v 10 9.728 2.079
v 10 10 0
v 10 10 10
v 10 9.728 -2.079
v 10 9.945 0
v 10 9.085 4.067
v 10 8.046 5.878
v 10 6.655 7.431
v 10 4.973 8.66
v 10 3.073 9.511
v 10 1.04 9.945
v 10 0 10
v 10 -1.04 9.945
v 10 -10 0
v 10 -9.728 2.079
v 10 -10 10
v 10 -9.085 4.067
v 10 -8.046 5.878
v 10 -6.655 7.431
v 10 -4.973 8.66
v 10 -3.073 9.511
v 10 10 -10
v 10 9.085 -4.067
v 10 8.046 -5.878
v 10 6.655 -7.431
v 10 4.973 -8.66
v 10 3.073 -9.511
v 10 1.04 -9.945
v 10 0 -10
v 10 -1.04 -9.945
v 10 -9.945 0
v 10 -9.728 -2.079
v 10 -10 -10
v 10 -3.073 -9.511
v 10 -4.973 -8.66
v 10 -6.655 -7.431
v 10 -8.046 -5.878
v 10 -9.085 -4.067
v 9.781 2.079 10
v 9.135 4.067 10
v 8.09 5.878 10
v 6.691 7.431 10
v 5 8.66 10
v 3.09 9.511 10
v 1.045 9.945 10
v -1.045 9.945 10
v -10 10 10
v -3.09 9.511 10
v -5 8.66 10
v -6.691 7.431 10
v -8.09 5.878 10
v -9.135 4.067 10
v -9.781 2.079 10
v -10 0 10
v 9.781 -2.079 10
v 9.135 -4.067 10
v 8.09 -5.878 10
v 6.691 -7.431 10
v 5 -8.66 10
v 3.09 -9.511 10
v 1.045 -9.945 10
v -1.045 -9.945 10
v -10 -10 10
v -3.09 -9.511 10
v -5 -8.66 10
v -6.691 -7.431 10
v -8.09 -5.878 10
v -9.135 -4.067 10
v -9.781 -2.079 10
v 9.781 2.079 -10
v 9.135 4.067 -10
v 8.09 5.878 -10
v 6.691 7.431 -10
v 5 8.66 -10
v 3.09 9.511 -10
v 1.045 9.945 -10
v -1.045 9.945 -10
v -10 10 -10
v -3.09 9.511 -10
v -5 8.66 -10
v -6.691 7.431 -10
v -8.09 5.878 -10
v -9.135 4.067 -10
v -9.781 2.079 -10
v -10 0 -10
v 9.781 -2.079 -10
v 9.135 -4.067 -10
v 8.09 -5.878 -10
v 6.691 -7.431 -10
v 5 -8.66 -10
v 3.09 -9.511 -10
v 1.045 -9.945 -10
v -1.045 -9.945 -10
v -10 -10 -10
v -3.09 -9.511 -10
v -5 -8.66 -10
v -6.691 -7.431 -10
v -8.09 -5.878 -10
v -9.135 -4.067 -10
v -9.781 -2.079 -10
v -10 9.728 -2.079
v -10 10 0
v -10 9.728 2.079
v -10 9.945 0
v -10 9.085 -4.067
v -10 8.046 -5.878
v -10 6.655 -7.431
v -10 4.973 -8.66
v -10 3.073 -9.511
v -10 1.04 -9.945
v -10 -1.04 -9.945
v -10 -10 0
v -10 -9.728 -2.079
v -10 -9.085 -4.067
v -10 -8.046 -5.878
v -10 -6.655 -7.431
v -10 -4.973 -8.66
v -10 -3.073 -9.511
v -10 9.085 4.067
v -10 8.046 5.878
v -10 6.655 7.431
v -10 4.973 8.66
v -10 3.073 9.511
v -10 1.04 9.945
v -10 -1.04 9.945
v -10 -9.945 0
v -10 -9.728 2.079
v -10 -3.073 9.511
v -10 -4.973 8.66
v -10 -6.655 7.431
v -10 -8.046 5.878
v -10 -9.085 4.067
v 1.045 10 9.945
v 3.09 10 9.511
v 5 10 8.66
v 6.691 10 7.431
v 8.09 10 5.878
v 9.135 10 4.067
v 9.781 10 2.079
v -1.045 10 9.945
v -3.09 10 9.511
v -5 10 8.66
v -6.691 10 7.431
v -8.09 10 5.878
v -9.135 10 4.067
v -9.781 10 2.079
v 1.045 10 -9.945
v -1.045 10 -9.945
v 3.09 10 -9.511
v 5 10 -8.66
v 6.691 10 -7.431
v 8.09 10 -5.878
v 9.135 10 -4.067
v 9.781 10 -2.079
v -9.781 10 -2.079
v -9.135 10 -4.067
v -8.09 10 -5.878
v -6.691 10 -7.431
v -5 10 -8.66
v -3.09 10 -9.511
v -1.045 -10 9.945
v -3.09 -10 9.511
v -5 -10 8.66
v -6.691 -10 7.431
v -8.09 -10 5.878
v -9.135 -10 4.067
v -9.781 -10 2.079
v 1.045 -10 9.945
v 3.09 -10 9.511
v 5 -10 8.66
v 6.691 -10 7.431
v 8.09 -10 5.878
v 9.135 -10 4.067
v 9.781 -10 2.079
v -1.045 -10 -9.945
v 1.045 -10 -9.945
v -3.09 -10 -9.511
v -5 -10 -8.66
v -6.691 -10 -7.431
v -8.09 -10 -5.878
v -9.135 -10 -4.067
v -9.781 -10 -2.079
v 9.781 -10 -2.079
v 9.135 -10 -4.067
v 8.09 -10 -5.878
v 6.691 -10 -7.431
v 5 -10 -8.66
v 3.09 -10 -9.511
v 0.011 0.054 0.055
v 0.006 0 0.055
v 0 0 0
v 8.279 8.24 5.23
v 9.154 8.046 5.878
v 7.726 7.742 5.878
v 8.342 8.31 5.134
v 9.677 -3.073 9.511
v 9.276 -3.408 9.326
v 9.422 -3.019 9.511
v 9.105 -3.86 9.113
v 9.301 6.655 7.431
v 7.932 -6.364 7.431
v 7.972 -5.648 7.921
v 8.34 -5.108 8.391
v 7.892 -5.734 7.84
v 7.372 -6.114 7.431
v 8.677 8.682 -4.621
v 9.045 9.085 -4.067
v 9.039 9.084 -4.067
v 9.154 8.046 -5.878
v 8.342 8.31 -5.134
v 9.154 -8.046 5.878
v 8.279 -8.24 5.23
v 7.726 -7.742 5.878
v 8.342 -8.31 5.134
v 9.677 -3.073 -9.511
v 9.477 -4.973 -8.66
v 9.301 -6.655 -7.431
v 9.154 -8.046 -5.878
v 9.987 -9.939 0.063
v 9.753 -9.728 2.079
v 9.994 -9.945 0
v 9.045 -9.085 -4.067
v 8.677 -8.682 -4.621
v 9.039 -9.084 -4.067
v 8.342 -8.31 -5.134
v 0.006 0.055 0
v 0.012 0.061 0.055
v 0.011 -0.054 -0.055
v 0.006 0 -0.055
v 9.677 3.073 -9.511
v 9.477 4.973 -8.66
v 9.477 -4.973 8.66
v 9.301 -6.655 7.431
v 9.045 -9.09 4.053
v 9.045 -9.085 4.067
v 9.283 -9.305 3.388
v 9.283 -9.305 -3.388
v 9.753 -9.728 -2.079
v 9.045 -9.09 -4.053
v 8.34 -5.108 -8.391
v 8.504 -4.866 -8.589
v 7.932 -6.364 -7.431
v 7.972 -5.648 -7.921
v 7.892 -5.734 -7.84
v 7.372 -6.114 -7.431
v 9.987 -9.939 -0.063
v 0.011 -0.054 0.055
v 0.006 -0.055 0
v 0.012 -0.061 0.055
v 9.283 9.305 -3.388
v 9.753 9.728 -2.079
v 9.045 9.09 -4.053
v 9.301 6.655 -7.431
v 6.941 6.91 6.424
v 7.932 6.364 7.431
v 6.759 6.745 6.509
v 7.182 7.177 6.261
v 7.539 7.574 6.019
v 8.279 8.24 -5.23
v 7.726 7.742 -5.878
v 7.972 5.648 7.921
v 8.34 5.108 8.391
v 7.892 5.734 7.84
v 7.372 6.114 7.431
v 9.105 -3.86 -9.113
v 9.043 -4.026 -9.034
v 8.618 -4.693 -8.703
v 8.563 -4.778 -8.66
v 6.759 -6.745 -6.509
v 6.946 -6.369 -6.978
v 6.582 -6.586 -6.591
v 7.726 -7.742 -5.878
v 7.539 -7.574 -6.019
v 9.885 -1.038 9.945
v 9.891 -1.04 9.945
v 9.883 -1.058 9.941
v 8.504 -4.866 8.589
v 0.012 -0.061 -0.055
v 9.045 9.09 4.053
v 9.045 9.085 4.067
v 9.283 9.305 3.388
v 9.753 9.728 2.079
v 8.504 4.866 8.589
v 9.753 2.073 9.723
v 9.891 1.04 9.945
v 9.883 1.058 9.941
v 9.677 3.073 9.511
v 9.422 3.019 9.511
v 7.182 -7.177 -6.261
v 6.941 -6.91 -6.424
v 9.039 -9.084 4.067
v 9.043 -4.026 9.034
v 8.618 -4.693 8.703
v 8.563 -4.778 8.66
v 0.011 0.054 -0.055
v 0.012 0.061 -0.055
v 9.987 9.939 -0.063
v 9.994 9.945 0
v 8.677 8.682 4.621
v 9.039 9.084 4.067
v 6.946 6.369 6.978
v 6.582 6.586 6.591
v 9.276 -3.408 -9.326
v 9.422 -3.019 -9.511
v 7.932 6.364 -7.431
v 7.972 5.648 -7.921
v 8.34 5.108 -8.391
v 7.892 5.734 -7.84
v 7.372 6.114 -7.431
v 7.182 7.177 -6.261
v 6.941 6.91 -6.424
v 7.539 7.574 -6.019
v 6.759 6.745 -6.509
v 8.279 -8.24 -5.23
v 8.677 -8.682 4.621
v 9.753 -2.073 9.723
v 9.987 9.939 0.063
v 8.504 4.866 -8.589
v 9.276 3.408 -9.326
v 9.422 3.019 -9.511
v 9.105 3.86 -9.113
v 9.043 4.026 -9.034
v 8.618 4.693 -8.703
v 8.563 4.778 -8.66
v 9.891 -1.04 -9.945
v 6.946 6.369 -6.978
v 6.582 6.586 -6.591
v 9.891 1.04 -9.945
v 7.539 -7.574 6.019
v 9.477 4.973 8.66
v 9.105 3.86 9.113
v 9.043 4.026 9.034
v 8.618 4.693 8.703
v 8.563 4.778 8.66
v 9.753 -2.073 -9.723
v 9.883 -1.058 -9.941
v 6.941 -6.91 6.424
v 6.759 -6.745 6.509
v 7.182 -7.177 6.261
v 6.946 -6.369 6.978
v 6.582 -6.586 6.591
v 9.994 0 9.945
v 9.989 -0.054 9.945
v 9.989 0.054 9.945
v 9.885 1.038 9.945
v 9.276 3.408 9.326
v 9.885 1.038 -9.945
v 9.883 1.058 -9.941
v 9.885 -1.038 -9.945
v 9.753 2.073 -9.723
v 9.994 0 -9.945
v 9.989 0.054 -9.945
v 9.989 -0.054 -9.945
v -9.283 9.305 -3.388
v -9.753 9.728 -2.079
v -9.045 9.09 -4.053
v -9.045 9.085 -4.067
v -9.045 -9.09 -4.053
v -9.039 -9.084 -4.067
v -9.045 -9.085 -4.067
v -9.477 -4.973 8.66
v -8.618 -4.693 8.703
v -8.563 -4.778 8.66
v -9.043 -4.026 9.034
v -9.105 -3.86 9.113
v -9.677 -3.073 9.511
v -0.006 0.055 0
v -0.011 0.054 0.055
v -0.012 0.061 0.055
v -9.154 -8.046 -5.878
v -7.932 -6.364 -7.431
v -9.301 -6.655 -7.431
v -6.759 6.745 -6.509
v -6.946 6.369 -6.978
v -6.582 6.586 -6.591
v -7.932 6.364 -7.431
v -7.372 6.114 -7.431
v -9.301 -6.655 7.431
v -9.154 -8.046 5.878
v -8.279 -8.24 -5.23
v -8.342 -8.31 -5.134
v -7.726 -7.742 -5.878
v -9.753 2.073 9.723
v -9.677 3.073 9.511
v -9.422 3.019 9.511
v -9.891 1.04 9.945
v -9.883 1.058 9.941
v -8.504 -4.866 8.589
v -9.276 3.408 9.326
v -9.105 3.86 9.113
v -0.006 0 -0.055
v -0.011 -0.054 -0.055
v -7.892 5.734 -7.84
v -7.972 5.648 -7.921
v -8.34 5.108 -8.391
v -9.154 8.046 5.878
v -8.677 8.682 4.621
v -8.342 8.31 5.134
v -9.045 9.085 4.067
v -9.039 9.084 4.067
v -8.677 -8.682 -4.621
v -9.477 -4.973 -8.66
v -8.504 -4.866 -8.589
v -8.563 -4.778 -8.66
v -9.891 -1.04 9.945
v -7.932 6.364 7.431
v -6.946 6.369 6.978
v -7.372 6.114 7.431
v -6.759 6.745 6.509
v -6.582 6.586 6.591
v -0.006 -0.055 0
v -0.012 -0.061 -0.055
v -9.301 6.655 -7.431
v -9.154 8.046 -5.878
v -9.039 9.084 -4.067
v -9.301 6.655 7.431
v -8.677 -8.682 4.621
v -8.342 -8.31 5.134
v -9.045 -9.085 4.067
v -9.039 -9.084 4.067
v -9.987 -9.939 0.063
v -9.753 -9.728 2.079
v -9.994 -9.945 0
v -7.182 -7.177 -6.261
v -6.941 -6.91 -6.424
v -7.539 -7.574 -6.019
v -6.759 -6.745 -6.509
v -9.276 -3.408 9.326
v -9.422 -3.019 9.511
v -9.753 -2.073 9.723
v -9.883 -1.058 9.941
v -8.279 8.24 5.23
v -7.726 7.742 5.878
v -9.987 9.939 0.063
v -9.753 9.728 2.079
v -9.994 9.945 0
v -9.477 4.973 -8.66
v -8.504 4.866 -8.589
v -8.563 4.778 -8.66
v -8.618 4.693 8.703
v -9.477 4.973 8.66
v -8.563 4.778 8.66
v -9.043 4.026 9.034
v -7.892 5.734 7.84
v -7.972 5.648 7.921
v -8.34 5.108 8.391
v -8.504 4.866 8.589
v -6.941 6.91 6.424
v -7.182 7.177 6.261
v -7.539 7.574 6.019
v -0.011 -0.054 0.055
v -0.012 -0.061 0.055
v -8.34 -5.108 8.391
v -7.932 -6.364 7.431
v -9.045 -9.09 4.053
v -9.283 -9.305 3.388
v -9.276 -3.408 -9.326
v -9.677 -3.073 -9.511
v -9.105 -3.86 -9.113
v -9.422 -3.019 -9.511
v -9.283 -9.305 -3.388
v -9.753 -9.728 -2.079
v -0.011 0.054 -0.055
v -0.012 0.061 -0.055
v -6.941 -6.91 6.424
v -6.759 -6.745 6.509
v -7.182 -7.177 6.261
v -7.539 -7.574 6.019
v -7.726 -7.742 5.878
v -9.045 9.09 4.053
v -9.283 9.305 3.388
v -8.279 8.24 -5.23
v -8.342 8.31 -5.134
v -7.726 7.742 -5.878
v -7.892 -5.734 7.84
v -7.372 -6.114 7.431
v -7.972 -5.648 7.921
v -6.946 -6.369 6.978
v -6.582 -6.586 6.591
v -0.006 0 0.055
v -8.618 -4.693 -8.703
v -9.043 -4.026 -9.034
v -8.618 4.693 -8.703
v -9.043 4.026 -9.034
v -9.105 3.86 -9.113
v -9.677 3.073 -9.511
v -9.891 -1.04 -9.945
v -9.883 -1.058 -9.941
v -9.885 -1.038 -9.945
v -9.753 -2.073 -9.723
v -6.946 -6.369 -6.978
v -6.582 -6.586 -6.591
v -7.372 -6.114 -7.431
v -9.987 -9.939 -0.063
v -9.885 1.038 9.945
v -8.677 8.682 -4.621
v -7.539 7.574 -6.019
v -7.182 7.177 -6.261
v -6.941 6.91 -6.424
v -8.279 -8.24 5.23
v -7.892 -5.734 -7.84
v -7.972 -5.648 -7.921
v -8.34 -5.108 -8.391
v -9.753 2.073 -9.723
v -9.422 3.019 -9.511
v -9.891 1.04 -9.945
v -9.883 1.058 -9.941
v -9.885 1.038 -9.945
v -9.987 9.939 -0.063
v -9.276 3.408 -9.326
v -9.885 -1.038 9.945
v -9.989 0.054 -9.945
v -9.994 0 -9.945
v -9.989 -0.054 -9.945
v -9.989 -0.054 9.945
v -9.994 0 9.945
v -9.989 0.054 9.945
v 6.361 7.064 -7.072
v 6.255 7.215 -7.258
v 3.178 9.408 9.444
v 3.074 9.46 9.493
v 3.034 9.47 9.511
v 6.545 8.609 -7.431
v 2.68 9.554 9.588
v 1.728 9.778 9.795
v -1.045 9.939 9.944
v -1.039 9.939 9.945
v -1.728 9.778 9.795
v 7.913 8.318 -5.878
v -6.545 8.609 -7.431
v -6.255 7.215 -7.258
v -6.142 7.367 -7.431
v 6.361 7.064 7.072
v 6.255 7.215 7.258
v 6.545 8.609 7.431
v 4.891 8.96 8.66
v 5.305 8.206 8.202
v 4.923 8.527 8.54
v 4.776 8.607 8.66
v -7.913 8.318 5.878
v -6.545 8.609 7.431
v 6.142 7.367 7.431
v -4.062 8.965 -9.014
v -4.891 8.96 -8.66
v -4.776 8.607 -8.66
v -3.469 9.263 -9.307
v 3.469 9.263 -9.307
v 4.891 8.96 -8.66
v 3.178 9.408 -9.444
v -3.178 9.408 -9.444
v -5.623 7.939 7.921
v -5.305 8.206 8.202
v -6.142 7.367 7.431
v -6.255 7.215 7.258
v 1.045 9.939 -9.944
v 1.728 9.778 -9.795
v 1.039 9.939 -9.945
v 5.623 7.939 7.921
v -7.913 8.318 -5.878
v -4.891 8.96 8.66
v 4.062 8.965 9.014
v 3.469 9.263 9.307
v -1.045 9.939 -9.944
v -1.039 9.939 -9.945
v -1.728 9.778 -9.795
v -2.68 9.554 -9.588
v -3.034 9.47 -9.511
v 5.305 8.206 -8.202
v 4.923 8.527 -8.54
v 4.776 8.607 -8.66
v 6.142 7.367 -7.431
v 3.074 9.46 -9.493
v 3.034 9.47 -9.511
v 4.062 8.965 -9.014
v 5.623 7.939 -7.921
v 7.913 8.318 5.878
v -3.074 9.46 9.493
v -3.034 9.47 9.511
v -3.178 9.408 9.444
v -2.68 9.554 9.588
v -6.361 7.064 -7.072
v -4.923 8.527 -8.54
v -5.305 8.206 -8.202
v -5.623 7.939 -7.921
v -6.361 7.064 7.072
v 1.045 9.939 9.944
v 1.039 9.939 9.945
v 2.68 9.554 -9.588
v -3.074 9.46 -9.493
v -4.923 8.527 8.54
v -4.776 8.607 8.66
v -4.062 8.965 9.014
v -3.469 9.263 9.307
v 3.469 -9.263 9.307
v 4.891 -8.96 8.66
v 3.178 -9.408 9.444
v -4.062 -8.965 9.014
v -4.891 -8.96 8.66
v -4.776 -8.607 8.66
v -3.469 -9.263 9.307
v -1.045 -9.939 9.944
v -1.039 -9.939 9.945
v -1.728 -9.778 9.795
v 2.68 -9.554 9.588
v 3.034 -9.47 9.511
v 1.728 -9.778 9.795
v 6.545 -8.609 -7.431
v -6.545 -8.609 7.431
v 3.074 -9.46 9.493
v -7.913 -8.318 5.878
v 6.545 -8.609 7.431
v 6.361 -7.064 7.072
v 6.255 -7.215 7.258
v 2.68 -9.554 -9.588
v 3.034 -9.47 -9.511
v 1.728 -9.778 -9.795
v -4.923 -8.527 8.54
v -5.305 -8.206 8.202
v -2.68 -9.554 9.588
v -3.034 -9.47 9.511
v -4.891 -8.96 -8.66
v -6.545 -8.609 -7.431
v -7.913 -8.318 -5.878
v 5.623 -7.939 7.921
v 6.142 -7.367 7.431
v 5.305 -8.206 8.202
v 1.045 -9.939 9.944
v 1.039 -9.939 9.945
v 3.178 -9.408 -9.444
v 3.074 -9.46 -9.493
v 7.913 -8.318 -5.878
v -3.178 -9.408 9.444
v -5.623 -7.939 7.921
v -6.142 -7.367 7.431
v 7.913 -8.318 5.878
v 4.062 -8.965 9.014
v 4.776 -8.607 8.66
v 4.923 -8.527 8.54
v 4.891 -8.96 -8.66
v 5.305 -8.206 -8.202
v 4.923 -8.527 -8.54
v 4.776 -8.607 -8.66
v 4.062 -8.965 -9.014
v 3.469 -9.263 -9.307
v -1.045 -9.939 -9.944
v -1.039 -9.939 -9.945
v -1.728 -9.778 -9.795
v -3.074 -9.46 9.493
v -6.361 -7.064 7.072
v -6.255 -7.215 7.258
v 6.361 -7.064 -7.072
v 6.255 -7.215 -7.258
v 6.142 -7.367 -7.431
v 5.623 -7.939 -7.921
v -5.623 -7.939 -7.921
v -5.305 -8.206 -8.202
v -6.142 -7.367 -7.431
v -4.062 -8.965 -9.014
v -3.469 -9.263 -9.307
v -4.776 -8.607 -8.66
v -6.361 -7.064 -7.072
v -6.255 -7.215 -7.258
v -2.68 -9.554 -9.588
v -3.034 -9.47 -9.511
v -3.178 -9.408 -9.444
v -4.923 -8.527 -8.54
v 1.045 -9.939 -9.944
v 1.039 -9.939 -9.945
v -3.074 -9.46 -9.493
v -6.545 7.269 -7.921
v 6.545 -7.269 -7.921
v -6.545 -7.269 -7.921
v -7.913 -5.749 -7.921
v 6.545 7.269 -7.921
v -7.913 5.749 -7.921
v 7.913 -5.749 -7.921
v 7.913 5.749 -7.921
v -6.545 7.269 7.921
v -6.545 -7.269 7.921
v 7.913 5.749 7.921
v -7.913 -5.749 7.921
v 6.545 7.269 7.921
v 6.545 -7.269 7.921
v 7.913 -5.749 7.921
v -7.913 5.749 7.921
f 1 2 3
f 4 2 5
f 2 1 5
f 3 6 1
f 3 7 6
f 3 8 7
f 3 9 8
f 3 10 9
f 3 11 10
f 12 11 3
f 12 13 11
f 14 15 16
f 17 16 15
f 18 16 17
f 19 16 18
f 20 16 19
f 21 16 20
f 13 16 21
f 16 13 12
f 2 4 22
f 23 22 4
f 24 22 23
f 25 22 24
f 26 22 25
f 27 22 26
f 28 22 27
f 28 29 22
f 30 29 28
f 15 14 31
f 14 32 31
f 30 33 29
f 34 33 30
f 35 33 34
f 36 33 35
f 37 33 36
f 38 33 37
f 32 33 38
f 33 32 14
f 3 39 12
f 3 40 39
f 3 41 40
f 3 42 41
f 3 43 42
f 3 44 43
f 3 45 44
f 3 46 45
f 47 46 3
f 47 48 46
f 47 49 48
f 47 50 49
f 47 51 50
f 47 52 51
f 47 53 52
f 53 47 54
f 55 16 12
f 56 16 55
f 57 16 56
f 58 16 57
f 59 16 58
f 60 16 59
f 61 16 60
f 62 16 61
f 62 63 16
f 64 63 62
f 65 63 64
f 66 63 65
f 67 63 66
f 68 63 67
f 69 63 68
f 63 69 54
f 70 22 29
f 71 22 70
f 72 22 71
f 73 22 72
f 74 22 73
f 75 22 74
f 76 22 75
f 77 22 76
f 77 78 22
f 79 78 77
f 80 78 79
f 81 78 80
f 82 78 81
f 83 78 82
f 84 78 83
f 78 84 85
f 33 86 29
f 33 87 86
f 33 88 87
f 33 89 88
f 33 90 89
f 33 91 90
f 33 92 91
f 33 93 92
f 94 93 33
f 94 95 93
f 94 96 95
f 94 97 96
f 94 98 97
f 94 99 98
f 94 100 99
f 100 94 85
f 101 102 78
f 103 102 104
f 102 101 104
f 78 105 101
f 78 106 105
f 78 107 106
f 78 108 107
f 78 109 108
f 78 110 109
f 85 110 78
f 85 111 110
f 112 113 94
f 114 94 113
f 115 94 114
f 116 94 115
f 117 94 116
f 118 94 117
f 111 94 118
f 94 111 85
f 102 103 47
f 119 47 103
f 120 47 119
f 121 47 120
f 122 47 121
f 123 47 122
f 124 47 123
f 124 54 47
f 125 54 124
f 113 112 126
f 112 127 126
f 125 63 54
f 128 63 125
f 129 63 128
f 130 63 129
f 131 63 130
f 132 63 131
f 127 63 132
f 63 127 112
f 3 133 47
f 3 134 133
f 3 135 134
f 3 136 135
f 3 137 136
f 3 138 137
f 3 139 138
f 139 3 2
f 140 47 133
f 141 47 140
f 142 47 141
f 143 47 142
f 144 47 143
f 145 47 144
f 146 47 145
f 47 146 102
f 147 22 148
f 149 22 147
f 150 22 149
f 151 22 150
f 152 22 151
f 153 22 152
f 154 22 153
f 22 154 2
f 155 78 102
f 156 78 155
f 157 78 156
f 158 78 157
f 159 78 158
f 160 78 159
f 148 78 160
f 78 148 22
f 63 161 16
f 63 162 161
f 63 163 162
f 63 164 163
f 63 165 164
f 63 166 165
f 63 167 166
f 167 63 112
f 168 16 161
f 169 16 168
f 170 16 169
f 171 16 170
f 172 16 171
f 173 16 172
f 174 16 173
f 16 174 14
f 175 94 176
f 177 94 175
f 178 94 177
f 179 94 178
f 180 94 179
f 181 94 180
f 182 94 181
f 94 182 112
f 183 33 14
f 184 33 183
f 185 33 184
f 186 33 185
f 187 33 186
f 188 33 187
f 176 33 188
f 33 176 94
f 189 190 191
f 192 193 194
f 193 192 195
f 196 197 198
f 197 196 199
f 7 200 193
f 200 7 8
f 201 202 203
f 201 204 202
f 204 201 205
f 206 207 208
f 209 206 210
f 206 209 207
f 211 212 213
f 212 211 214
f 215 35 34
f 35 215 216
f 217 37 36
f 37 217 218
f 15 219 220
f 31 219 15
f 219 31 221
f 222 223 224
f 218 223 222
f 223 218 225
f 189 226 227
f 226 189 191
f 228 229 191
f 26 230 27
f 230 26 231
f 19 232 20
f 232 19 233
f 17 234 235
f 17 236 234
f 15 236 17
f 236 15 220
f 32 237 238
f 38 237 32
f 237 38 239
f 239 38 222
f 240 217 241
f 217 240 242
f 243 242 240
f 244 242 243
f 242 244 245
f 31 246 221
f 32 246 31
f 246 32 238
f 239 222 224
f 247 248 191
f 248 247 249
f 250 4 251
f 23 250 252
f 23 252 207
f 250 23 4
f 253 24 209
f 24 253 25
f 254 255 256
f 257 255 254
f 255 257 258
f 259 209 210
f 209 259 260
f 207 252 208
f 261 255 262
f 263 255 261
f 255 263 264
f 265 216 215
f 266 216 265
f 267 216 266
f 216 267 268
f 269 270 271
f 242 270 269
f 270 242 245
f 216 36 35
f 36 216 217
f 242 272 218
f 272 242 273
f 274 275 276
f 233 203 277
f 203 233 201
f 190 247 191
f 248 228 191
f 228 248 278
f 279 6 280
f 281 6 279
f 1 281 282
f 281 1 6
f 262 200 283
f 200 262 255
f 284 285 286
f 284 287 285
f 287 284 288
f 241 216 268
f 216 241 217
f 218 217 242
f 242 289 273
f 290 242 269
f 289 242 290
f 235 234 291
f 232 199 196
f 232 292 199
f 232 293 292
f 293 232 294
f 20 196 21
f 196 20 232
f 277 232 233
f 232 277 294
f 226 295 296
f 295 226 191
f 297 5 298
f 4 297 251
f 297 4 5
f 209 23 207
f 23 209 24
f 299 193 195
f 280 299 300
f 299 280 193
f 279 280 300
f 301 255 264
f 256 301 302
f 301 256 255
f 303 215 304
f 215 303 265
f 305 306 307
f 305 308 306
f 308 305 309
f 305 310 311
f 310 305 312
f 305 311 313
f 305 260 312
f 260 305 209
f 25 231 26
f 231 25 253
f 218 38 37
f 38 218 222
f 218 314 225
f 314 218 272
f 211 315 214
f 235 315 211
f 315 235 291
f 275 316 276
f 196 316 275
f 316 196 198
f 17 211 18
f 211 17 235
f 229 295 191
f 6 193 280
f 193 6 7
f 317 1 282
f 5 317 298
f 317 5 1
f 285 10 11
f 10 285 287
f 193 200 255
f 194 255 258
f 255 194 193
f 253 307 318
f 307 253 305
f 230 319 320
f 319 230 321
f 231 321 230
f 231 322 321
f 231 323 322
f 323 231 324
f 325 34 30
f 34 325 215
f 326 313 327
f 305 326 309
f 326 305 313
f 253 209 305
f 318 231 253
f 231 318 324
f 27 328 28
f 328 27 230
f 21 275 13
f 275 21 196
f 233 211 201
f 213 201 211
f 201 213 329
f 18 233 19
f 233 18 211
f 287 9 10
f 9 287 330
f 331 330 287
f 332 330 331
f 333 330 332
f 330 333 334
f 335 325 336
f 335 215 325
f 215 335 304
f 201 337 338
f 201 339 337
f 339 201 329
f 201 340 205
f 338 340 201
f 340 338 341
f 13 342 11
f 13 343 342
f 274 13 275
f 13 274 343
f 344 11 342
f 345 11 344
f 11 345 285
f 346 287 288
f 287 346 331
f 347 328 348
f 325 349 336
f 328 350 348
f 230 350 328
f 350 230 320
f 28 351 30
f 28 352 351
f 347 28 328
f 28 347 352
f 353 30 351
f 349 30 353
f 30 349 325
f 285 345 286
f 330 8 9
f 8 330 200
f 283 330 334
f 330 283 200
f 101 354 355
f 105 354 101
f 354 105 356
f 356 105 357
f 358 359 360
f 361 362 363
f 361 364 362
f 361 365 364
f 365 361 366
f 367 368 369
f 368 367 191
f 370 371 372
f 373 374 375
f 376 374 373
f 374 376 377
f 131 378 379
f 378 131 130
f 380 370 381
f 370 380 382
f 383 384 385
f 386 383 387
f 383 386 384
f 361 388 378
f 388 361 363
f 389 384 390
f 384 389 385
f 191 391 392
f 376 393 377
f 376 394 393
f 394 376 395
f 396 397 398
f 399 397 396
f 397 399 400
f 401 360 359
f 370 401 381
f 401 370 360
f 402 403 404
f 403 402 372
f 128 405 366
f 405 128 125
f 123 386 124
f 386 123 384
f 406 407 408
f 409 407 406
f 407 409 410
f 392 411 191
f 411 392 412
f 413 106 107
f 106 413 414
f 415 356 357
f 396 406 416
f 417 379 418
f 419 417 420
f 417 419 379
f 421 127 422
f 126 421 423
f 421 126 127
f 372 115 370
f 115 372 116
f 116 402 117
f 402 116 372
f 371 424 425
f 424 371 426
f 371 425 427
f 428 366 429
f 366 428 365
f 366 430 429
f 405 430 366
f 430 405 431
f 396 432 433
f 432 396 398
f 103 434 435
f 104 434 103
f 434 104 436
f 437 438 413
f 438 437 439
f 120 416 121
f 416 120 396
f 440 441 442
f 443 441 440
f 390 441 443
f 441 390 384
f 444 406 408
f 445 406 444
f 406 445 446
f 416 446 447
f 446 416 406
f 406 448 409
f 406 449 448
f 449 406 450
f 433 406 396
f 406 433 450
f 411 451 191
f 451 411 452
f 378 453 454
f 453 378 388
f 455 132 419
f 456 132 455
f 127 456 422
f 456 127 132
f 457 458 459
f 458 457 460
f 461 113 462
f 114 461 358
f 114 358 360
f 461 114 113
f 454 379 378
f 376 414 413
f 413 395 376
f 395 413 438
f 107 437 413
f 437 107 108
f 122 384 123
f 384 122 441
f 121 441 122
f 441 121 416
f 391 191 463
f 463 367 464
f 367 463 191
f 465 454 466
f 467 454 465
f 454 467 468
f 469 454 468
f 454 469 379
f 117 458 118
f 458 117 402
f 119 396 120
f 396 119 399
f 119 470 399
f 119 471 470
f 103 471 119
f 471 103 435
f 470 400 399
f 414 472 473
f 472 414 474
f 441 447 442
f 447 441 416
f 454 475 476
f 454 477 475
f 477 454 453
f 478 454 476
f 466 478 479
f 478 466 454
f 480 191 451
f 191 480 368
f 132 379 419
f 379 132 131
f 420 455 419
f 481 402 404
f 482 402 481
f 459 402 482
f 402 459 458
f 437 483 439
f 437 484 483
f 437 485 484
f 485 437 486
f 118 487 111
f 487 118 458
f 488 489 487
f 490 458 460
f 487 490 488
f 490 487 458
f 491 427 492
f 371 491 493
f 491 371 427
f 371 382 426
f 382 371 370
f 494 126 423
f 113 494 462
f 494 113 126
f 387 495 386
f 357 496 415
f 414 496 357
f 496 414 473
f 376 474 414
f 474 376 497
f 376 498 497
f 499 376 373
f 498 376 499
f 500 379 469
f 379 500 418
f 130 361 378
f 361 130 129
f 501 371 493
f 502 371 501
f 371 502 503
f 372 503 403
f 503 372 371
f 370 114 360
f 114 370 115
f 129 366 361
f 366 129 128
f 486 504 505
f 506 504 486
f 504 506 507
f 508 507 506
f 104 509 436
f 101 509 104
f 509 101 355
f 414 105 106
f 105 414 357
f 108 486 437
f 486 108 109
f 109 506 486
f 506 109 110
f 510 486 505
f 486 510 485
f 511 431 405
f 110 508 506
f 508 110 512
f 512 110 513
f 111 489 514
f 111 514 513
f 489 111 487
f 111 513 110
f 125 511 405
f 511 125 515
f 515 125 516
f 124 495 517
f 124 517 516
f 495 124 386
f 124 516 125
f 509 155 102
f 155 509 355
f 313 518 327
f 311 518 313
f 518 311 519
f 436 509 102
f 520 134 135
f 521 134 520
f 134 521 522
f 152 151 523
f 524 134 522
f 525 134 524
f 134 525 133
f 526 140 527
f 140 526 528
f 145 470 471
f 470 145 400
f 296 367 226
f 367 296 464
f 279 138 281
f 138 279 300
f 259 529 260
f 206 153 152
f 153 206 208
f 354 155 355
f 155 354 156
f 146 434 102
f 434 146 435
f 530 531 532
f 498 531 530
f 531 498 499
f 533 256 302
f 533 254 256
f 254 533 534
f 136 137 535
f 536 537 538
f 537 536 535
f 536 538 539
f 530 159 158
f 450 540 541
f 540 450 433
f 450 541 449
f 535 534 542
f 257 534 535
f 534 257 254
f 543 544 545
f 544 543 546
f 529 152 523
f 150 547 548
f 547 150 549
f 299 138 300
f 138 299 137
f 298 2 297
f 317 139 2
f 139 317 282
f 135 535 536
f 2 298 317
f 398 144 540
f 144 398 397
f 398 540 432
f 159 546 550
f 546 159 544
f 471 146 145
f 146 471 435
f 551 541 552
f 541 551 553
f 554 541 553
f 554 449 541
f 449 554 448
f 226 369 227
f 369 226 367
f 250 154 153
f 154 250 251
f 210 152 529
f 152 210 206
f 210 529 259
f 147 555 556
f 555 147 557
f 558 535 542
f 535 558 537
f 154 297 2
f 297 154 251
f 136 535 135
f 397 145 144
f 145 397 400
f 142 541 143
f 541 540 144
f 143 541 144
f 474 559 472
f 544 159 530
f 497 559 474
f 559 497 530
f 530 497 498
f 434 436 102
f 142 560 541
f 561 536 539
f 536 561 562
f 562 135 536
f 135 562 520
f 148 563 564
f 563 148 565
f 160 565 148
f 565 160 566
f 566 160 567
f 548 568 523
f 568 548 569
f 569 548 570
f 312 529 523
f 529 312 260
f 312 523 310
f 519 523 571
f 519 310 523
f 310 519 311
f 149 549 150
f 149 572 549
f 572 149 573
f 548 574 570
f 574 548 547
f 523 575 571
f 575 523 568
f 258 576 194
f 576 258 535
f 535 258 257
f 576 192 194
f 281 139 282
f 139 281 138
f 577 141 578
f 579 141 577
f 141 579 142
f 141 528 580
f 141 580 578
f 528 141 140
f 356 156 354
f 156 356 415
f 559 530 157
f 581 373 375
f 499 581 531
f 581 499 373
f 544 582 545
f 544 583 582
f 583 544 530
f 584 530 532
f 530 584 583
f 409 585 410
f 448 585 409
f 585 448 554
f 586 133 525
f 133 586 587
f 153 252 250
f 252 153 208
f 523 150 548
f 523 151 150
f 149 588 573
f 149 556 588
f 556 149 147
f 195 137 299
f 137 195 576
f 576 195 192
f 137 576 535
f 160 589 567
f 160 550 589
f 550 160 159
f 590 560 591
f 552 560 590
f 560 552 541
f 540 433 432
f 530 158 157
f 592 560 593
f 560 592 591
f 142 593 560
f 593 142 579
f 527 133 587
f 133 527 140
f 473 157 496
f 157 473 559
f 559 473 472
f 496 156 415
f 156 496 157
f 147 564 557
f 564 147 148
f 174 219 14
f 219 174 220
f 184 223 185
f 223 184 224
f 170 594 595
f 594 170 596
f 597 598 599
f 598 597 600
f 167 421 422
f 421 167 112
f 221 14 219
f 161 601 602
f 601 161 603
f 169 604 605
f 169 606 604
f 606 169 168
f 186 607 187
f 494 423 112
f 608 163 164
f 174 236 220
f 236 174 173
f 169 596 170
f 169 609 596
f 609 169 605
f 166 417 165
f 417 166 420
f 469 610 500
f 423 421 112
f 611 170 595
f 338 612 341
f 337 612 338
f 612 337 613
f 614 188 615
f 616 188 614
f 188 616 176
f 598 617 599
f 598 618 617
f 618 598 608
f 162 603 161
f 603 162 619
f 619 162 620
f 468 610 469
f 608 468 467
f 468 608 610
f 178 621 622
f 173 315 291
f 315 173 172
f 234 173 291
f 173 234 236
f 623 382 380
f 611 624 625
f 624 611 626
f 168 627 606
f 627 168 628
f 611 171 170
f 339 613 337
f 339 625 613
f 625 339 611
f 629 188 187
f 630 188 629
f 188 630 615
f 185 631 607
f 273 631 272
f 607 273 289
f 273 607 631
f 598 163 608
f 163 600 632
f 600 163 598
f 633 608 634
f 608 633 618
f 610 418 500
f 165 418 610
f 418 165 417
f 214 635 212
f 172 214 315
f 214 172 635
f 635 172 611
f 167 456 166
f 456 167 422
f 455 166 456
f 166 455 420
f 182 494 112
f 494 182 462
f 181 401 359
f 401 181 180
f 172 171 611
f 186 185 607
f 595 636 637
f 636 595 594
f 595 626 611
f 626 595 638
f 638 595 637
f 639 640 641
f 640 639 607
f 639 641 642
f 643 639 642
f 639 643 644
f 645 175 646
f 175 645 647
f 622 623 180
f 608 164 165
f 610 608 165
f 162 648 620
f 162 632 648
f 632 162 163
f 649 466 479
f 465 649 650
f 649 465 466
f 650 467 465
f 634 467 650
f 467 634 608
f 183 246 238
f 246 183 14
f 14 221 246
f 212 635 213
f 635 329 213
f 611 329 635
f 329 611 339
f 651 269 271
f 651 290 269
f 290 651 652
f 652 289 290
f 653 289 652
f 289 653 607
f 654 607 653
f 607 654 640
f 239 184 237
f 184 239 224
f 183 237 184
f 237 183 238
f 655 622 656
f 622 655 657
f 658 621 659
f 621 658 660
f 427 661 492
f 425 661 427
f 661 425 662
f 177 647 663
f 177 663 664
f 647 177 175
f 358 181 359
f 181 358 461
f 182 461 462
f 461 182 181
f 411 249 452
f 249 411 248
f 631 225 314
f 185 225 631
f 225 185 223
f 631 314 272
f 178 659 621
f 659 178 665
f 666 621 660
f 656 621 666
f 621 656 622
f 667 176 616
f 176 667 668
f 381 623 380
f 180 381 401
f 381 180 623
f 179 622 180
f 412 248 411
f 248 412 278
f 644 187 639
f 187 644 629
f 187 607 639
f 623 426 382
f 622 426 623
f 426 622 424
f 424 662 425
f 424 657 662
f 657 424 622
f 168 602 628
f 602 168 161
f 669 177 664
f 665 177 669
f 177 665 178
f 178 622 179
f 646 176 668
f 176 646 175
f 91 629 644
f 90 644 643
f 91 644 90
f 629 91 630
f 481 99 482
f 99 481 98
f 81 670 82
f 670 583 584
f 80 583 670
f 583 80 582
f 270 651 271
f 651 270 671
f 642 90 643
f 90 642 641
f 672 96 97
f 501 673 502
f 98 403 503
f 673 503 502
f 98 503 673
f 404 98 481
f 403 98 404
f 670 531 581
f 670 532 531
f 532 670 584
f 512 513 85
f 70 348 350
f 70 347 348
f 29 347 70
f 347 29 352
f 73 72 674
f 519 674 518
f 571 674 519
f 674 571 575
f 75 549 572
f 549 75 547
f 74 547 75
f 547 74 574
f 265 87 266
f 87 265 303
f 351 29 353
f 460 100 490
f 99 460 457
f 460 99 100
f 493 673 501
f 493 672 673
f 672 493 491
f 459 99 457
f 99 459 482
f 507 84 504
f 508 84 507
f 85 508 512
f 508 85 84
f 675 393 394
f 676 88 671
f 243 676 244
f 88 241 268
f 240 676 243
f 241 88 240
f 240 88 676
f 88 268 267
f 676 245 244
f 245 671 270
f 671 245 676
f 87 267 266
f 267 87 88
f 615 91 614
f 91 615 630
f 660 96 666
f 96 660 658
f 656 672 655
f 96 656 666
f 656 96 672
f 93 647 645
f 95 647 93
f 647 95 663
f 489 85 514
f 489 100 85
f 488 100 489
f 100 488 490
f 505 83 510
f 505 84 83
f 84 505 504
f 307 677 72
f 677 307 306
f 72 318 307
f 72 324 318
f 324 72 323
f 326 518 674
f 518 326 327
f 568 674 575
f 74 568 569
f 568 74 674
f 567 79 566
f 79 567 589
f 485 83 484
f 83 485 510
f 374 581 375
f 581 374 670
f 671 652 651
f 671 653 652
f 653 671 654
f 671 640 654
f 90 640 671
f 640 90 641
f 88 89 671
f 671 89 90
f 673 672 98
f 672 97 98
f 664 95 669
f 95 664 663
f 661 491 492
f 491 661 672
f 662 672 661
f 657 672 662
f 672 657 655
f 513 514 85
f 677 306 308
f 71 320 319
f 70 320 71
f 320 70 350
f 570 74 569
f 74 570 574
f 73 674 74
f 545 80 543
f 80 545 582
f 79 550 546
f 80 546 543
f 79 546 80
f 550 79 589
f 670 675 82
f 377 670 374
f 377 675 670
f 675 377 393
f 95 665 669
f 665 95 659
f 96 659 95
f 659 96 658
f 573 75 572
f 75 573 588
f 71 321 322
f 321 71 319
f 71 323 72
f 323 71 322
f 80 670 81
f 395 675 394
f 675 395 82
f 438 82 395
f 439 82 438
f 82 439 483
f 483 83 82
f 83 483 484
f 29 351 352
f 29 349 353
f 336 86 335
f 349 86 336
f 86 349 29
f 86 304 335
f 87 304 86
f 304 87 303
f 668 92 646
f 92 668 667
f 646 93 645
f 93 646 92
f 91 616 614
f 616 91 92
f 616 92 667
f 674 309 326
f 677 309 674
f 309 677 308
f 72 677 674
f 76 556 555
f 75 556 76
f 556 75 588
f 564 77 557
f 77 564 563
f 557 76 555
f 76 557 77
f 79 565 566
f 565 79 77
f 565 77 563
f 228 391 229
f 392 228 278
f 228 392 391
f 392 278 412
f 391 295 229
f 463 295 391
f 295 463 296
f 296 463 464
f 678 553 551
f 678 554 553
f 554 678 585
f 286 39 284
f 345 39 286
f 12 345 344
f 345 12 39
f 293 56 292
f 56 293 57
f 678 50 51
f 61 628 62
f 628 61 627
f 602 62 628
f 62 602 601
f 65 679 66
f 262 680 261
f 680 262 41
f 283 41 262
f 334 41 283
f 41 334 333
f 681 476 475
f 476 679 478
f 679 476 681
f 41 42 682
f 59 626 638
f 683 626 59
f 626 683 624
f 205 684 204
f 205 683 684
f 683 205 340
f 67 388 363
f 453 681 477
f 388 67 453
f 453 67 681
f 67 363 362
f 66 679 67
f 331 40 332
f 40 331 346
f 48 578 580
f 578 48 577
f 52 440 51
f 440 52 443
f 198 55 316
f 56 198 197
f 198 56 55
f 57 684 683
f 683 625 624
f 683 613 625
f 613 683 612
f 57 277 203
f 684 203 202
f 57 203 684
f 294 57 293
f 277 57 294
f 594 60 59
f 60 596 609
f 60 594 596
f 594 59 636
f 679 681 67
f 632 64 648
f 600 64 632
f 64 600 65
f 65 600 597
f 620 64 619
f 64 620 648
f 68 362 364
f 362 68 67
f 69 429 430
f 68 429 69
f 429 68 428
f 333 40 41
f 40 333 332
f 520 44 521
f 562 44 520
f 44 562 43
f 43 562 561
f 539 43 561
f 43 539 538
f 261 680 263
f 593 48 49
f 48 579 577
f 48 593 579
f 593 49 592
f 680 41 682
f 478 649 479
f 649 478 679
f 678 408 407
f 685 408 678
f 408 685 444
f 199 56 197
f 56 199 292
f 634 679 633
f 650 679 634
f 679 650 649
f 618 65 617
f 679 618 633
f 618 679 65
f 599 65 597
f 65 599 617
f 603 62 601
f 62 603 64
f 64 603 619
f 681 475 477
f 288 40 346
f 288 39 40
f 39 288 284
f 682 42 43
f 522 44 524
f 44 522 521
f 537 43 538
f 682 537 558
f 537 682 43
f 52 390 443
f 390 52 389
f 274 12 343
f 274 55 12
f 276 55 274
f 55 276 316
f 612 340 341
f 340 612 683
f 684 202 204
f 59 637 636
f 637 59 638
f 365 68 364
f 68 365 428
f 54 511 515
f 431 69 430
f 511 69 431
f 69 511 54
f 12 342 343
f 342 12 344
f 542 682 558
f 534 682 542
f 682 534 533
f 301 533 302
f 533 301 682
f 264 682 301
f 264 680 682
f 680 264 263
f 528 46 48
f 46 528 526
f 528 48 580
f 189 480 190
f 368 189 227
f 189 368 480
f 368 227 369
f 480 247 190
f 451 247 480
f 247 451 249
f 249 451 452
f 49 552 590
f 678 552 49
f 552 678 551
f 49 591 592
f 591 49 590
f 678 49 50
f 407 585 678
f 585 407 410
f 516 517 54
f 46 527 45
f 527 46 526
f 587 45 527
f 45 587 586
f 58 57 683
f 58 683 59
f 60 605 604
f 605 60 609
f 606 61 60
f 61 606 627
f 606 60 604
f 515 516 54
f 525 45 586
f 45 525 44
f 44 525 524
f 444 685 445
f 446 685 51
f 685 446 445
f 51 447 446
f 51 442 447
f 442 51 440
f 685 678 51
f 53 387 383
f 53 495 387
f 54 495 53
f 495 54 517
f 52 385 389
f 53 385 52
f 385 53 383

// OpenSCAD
difference() {
cube(20, center = true);
translate([10,0,0]) sphere(10);
translate([-10,0,0]) sphere(10);
translate([0,10,0]) sphere(10);
translate([0,-10,0]) sphere(10);
translate([0,0,-10]) sphere(10);
translate([0,0,10]) sphere(10);
}
